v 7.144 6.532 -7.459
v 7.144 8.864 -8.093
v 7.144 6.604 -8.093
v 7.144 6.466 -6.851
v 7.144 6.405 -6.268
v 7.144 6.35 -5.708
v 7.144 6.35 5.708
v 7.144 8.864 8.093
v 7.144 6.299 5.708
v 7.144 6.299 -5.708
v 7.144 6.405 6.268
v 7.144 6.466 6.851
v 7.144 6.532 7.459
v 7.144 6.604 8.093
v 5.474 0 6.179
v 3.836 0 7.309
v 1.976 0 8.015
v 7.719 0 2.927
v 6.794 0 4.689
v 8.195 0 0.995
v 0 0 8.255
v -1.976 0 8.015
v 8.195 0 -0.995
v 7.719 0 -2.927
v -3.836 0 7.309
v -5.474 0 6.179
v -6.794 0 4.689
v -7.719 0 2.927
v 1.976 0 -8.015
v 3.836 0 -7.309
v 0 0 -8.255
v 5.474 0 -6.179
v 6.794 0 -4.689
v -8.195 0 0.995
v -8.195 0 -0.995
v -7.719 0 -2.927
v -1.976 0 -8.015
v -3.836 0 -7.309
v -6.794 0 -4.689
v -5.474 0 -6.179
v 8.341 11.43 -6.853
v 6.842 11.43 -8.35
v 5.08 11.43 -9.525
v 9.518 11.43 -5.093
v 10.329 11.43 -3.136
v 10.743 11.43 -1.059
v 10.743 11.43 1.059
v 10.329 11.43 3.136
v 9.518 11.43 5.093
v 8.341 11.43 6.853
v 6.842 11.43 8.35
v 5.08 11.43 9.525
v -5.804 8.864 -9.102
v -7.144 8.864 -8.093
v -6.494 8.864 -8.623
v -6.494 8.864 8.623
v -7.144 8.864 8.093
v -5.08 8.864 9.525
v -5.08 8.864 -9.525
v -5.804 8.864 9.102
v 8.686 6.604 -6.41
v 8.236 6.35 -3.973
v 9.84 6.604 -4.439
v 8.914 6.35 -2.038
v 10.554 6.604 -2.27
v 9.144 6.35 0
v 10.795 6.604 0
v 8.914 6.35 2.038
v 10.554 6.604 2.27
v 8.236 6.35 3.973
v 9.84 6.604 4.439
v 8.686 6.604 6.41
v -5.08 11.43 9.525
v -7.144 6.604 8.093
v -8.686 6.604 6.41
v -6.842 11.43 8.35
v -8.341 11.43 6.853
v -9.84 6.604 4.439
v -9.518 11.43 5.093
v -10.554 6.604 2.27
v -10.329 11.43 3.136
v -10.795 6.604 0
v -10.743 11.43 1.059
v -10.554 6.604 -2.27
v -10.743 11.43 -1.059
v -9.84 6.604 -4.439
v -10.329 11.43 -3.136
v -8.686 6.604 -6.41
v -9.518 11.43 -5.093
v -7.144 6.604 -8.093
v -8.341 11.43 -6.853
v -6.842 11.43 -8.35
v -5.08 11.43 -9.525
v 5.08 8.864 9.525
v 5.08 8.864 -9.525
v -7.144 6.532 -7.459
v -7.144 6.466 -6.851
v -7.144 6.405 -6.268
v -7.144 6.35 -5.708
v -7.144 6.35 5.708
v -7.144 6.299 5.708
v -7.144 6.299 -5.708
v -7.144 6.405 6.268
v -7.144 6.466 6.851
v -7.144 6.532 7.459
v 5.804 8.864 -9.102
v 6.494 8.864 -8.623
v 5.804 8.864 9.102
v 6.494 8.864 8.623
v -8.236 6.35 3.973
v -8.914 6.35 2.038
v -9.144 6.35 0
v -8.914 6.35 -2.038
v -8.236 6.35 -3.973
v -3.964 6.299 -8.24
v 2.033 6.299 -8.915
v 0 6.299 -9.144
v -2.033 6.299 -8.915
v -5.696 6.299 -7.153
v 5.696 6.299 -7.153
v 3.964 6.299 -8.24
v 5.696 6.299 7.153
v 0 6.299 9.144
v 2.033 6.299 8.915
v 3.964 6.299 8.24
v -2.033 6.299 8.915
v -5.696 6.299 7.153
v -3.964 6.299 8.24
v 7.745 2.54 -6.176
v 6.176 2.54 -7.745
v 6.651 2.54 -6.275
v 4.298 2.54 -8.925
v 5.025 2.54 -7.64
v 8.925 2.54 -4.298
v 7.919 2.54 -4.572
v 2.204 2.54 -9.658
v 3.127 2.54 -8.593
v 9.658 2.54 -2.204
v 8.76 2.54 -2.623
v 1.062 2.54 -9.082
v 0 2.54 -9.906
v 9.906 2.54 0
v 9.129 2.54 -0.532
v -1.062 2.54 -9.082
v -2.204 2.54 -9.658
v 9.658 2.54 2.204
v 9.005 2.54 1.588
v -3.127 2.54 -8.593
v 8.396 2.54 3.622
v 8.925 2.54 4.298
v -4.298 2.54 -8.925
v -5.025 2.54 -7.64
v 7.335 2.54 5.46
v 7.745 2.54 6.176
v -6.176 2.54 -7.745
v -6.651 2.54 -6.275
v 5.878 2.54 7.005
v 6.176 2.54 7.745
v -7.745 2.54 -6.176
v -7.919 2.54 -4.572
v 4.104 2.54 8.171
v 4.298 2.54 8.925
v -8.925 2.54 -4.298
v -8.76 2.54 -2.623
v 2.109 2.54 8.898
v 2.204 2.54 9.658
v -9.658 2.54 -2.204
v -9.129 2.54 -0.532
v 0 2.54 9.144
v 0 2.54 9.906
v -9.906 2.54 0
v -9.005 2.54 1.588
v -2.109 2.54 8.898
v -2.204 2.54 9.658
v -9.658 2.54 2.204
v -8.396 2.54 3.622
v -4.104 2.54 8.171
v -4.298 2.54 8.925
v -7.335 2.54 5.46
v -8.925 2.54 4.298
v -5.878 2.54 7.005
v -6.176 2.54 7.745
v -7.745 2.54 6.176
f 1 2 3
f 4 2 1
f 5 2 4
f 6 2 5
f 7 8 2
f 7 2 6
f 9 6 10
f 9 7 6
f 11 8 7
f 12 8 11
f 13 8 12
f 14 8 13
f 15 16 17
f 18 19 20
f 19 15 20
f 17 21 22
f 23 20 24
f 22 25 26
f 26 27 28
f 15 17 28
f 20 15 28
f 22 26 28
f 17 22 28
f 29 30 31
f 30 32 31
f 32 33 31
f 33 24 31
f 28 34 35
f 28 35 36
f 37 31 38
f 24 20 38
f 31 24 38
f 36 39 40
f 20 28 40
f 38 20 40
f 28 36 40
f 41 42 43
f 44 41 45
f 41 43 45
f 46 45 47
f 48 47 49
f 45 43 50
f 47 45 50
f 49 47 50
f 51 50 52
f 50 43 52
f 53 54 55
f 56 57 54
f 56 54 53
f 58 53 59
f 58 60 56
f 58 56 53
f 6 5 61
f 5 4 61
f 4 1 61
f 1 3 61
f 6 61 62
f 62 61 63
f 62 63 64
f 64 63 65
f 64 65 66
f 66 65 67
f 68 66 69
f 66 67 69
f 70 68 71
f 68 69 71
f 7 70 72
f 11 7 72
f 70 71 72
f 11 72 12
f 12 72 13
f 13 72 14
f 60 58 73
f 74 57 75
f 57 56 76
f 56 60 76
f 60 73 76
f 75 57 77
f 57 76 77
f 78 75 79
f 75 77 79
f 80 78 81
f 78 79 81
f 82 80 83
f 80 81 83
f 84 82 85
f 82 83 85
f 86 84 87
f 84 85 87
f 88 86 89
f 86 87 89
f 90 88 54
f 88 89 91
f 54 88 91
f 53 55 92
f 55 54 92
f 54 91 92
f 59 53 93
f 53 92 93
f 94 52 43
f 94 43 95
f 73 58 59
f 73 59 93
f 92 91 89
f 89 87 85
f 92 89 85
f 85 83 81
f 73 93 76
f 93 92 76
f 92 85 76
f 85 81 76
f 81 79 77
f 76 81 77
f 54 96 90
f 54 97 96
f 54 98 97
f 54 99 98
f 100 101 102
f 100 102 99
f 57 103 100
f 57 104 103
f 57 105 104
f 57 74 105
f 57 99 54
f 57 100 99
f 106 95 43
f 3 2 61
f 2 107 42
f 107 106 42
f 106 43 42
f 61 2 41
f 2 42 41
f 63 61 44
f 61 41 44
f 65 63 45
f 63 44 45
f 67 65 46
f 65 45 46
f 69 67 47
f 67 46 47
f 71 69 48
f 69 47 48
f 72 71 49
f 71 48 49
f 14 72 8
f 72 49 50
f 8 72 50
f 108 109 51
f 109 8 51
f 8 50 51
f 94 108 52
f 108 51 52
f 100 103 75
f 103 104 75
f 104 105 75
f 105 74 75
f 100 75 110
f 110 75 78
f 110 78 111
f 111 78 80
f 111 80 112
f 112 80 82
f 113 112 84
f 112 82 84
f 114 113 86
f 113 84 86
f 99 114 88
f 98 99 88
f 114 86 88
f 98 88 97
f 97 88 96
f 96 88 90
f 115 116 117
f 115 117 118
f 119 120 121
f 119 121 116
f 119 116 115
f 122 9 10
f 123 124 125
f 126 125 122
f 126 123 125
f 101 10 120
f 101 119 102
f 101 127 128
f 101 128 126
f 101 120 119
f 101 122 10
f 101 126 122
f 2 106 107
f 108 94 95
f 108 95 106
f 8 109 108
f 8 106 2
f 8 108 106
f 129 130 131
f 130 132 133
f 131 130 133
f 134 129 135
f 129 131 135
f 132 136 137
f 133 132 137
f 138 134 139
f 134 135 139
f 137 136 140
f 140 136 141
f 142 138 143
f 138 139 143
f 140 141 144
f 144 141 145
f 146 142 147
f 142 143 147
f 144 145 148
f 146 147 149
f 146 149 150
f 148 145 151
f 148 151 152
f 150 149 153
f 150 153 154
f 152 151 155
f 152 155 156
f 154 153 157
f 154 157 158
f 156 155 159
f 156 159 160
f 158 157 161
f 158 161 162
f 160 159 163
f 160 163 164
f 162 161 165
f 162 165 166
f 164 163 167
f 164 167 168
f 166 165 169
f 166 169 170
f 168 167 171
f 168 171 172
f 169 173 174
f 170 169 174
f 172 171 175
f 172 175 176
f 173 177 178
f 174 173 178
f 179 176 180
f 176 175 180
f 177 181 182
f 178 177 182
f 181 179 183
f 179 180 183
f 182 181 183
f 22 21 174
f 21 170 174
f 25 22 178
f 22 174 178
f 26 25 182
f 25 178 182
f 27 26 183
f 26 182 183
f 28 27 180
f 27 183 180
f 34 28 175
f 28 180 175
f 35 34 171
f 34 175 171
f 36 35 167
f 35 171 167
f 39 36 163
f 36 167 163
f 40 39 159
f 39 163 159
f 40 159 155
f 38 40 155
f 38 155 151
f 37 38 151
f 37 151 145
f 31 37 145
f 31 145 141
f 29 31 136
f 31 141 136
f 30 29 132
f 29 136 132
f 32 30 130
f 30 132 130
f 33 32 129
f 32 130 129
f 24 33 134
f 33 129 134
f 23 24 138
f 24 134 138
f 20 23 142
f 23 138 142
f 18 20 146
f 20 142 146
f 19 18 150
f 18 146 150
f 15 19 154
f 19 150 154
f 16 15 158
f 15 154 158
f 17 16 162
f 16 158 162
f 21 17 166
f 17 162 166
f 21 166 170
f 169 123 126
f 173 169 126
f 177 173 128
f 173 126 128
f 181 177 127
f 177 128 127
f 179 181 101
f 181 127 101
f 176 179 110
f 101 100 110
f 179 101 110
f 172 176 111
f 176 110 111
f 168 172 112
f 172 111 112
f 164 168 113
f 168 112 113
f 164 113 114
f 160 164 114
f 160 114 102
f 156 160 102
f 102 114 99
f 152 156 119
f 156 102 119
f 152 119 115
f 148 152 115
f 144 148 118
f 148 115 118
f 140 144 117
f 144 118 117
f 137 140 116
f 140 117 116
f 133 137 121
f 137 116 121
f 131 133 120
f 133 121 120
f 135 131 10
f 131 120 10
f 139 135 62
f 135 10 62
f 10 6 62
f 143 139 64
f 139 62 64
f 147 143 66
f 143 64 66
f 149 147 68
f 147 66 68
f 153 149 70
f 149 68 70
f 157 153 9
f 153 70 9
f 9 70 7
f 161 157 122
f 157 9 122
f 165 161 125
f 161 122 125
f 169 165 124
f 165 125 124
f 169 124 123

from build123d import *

# Parameters (mm, degrees)
CUT_EXTRUDE1_DEPTH = 19.05


with BuildPart() as part:
    # Sketch1 → Revolve1 (revolve)
    with BuildSketch(Plane.XY, mode=Mode.PRIVATE) as revolve1_sk:
        Polygon((0, 0), (-8.255, 0), (-9.906, 2.54), (-9.144, 2.54), (-9.144, 6.35), (-10.795, 6.604), (-10.795, 11.43), (0, 11.43), align=None)
    revolve(revolve1_sk.sketch.rotate(Axis((0, 11.43, 0), (0, -1, 0)), 270), axis=Axis((0, 11.43, 0), (0, -1, 0)))  # turned: the seam where the file's is

    # Sketch2 → Cut-Extrude1 (cut, symmetric)
    with BuildSketch(Plane.XY):
        Polygon((7.14375, 6.298580206), (-7.14375, 6.298580206), (-7.14375, 8.863980206), (-5.08, 8.863980206), (-5.08, 11.43), (5.08, 11.43), (5.08, 8.863980206), (7.14375, 8.863980206), align=None)
    extrude(amount=CUT_EXTRUDE1_DEPTH, both=True, mode=Mode.SUBTRACT)


solid = part.part
